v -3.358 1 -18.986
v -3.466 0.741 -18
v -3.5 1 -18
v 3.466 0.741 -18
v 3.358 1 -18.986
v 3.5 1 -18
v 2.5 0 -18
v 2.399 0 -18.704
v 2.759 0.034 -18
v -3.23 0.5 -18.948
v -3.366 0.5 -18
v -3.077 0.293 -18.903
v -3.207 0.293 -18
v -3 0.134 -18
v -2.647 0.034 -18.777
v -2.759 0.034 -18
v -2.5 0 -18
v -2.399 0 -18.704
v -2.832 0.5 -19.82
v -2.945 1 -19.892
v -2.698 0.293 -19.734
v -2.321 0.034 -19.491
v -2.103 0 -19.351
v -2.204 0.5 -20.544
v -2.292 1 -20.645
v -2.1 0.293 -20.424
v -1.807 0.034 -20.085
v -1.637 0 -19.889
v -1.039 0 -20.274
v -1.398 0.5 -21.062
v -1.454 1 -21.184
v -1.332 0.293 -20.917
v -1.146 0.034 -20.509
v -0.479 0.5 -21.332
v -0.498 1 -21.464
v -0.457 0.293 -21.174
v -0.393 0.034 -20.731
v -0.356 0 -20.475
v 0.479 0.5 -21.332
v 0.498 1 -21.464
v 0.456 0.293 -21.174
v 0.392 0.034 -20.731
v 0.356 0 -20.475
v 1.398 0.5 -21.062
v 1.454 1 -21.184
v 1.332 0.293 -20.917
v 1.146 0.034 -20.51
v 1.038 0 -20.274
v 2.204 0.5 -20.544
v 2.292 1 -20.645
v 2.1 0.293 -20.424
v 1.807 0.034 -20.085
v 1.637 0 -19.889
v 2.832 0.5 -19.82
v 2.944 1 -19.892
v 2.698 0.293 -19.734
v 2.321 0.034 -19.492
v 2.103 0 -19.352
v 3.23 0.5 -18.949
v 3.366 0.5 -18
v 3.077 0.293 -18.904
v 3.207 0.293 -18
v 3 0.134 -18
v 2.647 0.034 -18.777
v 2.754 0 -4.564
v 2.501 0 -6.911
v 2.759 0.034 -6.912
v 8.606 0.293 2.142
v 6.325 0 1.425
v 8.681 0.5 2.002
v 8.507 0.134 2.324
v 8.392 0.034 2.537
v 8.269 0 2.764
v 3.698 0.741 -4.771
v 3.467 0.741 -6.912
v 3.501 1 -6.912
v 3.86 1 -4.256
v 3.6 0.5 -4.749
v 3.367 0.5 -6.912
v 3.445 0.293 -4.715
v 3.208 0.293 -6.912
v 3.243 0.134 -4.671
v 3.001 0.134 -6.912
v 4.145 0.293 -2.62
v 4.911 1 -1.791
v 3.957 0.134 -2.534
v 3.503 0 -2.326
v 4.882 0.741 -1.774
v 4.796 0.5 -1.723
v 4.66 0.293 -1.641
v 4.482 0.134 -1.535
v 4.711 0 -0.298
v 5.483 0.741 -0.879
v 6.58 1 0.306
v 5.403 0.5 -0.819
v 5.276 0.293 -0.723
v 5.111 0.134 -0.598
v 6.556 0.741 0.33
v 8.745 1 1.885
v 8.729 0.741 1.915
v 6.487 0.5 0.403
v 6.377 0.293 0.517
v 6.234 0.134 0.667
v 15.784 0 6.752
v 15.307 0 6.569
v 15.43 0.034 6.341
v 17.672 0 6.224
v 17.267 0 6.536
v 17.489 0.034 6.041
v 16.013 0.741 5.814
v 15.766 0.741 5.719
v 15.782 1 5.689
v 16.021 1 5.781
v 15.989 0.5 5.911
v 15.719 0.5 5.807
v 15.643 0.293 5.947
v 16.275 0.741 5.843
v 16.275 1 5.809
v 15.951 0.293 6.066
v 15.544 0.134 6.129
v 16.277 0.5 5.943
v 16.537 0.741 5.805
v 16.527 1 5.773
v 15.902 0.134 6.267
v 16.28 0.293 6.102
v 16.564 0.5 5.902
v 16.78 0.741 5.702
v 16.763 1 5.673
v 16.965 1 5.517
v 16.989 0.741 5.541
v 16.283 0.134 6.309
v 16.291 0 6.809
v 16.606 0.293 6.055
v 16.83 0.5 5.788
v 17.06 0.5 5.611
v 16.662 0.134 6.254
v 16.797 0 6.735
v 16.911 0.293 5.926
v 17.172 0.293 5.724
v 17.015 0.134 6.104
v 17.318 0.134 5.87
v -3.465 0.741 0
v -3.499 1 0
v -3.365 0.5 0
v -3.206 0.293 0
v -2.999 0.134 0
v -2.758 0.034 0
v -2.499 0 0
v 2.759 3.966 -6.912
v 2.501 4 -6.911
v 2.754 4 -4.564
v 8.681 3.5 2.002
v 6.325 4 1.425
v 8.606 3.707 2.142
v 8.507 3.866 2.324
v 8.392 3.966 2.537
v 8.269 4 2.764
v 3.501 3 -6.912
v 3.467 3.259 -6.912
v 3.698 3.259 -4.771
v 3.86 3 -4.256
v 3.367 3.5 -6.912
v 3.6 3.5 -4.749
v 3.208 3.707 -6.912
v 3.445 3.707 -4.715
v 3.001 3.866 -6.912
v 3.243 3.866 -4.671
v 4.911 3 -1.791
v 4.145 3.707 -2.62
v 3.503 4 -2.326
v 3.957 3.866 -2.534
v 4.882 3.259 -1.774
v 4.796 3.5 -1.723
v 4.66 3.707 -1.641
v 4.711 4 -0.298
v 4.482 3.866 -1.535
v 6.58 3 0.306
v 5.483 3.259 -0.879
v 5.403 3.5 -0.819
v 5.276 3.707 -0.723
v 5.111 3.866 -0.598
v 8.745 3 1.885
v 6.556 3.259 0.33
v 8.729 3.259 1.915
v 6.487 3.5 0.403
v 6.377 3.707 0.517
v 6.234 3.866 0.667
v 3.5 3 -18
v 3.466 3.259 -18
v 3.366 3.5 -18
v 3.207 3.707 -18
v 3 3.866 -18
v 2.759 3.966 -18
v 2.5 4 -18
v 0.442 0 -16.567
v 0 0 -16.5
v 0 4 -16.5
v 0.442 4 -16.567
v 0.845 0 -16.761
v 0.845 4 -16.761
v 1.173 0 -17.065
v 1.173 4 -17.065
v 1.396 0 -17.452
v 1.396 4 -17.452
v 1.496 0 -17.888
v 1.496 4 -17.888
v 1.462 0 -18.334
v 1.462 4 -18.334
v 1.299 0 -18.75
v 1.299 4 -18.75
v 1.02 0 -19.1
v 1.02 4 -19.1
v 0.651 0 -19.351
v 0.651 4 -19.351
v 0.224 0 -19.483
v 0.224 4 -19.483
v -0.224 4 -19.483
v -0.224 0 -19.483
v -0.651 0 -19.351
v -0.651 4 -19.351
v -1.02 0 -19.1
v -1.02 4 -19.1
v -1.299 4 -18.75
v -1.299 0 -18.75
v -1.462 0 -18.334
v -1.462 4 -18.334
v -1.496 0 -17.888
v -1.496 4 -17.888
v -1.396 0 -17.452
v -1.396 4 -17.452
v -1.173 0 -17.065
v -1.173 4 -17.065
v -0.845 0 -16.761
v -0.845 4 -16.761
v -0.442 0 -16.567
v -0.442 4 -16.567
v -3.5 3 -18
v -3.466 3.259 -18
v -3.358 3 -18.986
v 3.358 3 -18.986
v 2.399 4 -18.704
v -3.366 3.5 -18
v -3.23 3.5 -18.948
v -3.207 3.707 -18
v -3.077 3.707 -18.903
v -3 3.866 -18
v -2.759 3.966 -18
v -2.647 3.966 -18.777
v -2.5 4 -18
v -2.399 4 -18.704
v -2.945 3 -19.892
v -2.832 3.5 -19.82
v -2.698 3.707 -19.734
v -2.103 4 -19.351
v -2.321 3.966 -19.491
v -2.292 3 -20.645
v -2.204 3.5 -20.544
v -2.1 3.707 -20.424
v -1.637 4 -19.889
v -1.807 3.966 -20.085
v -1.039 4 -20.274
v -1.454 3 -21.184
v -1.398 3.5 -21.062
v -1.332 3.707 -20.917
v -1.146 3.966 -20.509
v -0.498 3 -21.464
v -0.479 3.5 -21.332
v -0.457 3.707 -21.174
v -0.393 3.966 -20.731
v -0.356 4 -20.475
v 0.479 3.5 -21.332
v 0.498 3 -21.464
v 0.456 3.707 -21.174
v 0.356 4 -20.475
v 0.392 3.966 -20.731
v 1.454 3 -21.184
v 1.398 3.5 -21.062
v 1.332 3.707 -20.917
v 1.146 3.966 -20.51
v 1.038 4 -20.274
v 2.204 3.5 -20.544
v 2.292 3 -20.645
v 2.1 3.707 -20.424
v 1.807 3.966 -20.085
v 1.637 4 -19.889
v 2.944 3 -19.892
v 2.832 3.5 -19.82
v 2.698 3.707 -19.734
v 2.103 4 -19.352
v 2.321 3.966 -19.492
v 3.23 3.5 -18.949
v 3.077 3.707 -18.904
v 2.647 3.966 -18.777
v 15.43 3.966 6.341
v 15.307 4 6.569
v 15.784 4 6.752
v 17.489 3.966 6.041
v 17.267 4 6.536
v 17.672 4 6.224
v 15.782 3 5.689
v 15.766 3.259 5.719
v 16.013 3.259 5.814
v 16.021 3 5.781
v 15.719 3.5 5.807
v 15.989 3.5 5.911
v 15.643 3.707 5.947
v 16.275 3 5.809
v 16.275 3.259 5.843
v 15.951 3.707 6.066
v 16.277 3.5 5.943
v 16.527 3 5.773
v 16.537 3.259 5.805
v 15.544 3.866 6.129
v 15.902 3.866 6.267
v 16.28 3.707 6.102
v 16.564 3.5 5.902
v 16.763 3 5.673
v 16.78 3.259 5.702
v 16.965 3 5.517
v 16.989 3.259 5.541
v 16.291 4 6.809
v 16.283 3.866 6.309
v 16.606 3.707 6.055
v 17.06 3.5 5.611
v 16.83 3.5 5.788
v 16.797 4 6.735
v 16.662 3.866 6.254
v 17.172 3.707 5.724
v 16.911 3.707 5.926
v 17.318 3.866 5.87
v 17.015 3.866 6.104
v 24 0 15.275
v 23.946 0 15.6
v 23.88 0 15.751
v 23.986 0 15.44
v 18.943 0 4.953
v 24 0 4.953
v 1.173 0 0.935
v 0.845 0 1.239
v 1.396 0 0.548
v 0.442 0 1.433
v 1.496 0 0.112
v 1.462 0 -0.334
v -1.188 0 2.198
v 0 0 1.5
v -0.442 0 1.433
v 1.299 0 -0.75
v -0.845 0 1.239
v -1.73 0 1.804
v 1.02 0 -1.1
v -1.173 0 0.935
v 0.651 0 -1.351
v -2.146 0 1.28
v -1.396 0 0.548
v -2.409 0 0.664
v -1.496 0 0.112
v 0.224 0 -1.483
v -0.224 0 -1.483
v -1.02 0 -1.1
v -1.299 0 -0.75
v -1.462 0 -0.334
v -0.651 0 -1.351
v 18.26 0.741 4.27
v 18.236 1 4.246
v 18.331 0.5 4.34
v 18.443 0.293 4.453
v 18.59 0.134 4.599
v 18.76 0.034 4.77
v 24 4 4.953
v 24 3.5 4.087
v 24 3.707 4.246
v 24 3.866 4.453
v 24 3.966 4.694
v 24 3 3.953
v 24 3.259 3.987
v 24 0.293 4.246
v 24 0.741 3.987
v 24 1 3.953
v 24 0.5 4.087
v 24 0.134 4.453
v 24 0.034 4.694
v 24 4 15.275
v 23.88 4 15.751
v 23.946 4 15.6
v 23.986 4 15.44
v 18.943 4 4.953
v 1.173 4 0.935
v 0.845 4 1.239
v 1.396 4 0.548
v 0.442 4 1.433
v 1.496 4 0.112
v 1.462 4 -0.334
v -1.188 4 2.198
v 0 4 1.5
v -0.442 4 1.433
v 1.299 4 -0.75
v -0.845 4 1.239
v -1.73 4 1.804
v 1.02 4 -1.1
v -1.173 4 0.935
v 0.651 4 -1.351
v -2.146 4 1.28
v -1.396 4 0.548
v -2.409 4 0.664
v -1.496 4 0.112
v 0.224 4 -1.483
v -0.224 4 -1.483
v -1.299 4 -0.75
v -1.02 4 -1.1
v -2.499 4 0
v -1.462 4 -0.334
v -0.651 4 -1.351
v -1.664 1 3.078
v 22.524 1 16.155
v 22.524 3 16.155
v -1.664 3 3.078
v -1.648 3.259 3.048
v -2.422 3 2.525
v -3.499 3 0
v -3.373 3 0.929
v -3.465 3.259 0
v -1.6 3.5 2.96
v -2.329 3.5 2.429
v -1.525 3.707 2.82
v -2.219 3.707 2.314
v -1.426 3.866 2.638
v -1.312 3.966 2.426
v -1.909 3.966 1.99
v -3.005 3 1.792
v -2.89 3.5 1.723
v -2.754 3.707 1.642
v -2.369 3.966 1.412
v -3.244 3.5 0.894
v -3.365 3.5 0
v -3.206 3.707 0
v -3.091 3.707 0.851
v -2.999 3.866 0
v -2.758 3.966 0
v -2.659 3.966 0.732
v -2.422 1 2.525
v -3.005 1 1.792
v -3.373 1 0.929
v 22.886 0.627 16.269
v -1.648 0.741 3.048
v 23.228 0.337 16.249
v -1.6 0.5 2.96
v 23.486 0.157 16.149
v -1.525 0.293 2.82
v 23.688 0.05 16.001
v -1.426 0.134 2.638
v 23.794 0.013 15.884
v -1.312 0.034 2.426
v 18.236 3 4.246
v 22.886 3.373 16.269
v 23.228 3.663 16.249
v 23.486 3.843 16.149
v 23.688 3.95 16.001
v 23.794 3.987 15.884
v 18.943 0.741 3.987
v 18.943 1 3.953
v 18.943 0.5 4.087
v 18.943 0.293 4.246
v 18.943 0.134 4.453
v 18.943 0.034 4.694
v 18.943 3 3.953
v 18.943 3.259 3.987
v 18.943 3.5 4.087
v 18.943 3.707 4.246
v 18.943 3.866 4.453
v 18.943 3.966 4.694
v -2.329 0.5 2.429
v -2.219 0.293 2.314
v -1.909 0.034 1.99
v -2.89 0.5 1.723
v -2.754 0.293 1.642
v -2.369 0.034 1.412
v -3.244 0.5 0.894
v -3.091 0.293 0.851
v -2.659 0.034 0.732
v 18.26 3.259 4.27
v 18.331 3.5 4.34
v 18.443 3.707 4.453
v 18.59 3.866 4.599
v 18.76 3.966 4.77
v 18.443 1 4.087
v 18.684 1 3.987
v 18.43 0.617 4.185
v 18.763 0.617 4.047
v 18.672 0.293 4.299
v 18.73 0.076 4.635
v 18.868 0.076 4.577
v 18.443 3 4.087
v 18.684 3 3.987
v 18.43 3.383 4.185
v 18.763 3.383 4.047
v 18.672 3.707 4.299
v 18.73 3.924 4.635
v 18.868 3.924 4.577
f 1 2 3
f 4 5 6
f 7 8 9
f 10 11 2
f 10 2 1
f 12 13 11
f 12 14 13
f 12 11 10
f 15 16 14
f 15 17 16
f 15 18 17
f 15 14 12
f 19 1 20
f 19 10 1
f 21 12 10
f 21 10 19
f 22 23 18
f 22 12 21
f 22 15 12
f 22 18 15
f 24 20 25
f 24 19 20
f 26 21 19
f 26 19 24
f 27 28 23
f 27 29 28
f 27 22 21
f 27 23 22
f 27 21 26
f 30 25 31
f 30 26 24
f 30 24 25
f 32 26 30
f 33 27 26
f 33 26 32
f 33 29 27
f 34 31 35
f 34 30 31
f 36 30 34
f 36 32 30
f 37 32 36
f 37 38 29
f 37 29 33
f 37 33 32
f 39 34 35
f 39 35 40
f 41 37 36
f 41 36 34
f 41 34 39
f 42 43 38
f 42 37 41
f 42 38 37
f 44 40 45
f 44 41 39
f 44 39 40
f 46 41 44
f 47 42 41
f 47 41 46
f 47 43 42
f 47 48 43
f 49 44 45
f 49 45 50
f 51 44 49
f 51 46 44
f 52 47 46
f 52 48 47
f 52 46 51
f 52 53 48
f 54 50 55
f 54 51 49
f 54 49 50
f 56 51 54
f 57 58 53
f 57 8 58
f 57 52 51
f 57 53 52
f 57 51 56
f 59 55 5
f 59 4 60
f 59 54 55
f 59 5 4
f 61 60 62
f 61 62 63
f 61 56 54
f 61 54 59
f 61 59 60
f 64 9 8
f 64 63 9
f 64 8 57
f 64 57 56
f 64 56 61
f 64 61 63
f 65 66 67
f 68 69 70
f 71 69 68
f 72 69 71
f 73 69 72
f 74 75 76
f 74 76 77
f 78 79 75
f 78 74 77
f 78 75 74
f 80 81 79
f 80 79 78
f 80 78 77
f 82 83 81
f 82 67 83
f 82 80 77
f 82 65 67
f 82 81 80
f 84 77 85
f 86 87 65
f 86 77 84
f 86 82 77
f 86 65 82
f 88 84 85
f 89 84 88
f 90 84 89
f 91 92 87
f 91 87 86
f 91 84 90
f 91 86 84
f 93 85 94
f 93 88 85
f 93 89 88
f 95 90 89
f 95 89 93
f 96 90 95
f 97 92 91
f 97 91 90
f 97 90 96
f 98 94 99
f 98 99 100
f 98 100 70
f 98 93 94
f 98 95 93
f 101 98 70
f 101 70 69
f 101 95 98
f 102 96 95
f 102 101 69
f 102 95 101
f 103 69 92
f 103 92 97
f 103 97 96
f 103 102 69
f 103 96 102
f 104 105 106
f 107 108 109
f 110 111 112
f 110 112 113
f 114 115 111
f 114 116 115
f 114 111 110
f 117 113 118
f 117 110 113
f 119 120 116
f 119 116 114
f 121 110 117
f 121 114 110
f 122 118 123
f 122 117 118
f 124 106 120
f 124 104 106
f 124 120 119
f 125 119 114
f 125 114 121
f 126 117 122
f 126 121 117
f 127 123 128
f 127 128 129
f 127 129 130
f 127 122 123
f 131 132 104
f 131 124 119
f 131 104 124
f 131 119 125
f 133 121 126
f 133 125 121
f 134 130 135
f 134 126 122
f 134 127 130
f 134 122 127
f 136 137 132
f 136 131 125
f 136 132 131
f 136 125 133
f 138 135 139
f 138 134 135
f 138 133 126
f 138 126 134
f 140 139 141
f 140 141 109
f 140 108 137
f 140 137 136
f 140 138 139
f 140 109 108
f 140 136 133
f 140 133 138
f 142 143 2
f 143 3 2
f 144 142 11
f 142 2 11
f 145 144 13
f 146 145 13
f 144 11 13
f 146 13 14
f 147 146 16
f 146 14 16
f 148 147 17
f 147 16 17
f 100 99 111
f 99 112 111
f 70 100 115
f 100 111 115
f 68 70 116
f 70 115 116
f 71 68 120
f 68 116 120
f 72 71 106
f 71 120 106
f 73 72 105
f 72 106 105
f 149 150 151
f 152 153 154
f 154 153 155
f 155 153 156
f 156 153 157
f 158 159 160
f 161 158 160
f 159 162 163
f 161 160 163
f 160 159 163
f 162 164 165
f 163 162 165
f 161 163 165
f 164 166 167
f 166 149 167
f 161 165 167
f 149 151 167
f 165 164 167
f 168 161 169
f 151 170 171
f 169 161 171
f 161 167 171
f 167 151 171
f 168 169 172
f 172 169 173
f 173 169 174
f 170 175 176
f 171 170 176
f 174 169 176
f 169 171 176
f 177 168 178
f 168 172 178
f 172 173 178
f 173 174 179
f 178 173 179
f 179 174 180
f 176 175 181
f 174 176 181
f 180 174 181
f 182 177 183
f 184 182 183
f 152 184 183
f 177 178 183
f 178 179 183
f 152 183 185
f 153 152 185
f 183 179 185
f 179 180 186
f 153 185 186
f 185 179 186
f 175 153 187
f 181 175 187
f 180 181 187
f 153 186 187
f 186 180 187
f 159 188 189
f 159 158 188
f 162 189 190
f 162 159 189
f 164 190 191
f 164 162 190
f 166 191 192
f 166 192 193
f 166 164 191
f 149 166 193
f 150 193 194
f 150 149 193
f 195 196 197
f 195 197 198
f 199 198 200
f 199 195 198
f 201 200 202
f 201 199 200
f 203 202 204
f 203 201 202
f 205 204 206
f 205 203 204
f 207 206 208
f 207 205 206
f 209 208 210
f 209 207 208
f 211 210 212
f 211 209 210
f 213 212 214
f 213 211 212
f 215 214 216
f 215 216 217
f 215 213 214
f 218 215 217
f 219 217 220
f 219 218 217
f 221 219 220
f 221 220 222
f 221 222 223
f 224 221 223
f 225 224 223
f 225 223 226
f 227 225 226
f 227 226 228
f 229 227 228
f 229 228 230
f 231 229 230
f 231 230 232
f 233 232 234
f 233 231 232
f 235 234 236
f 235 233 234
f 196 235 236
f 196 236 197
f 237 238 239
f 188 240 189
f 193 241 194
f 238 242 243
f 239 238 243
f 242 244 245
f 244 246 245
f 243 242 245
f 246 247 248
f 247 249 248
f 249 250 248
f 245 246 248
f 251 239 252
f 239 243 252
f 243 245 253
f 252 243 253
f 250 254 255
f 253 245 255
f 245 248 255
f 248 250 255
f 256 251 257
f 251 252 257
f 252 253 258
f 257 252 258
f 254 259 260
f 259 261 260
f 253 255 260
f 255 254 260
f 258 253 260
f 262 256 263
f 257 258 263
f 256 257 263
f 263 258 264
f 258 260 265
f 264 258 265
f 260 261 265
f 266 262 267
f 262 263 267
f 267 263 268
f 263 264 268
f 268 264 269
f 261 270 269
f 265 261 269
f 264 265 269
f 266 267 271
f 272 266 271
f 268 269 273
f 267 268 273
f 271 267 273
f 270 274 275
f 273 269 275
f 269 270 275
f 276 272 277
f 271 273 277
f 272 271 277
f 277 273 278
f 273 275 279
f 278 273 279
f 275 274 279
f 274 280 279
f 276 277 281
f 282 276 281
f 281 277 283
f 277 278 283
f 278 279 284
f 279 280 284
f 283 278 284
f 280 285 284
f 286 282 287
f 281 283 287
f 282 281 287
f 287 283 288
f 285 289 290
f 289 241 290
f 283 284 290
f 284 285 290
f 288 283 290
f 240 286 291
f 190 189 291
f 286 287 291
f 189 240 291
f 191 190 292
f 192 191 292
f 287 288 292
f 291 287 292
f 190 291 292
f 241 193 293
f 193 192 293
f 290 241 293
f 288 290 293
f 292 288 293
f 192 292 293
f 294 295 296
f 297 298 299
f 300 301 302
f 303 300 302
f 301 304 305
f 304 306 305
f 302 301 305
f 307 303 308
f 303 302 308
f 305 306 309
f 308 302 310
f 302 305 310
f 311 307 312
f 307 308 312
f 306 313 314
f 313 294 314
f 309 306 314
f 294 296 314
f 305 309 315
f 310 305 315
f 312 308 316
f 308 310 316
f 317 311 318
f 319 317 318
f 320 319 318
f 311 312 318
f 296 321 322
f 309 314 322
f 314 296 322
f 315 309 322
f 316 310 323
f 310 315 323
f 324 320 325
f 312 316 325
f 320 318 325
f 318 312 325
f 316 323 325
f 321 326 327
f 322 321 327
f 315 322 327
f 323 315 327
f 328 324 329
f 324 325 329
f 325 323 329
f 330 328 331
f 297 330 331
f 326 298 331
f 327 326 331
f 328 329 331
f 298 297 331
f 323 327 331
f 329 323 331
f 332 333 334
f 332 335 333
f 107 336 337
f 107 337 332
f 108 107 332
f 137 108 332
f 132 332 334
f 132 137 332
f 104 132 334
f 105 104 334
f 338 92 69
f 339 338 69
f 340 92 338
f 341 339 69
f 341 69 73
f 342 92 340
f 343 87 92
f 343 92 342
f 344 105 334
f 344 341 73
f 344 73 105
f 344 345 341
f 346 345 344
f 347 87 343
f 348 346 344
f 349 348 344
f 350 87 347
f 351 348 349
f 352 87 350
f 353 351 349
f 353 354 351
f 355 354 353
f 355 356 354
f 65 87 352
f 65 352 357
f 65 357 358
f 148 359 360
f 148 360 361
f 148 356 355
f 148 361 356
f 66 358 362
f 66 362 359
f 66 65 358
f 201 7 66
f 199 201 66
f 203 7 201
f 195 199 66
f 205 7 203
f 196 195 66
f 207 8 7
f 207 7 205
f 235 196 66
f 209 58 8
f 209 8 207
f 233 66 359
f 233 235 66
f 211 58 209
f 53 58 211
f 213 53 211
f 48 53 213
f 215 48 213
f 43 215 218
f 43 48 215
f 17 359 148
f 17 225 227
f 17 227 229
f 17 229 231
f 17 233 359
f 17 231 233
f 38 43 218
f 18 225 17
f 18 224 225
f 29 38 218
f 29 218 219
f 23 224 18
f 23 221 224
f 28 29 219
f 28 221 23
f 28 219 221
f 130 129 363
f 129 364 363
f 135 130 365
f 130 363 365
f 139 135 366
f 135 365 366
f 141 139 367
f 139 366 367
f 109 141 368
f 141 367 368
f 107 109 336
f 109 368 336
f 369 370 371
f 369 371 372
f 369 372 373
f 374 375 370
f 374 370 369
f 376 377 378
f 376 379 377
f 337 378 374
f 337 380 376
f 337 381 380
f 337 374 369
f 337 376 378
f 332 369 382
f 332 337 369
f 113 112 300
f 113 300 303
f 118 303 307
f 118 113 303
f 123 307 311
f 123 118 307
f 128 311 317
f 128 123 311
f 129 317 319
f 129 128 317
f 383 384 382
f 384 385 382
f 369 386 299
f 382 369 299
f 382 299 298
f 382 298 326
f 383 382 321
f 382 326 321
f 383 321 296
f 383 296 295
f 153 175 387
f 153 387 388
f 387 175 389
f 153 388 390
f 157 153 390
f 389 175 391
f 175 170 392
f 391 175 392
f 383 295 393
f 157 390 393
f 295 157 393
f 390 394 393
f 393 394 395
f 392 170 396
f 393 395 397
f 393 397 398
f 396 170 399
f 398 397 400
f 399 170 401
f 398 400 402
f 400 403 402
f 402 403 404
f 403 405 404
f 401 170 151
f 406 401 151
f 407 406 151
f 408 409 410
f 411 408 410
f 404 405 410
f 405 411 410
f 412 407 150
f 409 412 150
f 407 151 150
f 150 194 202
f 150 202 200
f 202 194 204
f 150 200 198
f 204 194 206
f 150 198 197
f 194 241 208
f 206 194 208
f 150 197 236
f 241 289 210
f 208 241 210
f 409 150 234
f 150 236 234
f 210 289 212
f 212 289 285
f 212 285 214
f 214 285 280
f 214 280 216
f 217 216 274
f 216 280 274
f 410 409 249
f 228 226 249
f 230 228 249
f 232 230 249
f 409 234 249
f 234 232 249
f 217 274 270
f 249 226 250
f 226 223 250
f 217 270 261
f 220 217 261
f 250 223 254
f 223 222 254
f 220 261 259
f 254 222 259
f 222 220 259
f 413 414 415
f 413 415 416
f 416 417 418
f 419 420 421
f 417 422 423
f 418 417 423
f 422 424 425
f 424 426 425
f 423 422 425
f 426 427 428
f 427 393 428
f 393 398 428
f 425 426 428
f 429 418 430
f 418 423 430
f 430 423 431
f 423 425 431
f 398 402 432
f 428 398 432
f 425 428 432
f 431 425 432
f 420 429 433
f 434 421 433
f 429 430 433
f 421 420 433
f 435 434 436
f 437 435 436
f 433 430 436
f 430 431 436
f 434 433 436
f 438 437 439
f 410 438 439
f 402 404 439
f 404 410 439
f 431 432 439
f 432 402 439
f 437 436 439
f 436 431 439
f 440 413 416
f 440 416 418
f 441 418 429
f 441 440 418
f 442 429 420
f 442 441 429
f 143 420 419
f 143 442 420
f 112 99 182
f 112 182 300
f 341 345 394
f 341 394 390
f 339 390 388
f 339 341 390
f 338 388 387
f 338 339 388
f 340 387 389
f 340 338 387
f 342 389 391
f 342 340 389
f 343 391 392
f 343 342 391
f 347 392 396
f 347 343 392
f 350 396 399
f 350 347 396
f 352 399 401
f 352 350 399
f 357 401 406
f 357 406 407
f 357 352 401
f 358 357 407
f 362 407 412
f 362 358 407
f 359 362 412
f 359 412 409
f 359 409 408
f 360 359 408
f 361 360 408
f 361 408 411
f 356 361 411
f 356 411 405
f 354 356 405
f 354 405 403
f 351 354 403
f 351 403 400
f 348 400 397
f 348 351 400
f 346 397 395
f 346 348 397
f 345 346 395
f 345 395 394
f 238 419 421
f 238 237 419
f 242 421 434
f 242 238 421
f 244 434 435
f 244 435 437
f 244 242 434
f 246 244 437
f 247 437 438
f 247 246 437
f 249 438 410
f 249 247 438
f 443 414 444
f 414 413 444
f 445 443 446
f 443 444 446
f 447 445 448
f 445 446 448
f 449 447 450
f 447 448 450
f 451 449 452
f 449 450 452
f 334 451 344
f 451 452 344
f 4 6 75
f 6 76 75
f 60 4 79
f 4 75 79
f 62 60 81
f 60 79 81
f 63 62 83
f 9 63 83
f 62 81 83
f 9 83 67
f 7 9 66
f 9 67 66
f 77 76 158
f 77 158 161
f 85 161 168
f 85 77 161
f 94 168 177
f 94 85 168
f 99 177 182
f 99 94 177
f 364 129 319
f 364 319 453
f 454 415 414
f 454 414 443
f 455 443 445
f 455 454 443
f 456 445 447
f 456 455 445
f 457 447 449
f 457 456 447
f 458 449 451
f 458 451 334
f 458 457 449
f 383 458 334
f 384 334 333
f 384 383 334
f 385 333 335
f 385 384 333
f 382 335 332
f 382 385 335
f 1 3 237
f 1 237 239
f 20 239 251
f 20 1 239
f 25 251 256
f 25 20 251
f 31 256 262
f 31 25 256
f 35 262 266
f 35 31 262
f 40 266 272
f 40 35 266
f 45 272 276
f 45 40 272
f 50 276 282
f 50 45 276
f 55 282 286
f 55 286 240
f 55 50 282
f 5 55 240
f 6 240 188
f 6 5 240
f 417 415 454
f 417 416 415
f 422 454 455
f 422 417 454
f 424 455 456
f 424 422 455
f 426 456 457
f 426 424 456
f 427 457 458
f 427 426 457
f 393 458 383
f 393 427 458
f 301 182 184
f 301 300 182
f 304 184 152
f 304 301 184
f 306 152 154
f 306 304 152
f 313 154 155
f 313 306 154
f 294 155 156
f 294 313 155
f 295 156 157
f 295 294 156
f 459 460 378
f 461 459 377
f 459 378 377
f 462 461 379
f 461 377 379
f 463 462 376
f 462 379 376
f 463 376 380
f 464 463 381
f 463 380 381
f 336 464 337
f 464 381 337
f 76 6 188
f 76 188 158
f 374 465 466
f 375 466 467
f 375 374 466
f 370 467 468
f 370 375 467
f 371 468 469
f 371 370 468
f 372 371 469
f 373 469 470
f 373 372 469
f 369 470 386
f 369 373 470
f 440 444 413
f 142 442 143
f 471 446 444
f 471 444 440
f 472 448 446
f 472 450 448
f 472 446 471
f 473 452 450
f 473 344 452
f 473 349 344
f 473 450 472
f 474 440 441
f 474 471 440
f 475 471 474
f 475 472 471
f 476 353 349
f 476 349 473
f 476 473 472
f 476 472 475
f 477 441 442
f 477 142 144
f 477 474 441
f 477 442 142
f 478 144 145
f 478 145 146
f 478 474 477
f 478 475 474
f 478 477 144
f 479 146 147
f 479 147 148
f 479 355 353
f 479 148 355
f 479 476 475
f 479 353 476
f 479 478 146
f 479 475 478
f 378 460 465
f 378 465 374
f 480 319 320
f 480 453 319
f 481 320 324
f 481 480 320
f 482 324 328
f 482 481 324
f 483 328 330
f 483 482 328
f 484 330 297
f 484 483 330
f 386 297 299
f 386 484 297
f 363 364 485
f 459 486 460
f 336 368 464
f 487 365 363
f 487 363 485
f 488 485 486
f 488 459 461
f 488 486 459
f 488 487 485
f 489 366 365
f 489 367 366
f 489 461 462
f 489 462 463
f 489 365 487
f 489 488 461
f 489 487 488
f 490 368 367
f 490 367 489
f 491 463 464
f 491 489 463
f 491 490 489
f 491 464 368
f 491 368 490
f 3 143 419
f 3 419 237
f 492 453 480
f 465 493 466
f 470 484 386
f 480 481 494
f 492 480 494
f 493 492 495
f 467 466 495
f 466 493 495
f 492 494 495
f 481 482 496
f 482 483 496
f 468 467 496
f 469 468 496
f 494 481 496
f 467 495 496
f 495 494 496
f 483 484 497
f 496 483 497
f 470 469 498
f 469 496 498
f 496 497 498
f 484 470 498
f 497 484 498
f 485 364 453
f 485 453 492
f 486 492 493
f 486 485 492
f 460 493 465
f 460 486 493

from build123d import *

# Parameters (mm, degrees)
SKETCH1_R           = 1.5
BOSS_EXTRUDE1_DEPTH = 4
FILLET1_R           = 1


with BuildPart() as part:
    # Sketch1 → Boss-Extrude1 (new body)
    with BuildSketch(Plane(origin=(0, 0, 0), x_dir=(1, 0, 0), z_dir=(0, 1, 0))):
        with BuildLine():
            Line((3.499999994, 18.000210437), (3.500666698, 6.911553125))
            ThreePointArc((3.500666698, 6.911553125), (4.91134936, 1.791253282), (8.744863366, -1.884568587))
            Line((8.744863366, -1.884568587), (15.782241735, -5.689211238))
            ThreePointArc((15.782241735, -5.689211238), (16.402202946, -5.79906113), (16.964928847, -5.516645723))
            Line((16.964928847, -5.516645723), (18.23595273, -4.24562184))
            ThreePointArc((18.23595273, -4.24562184), (18.560376079, -4.028849089), (18.943059511, -3.952728622))
            Line((18.943059511, -3.952728622), (24, -3.952728622))
            Line((24, -3.952728622), (24, -16.952728622))
            Line((24, -16.952728622), (-1.664016467, -3.077901019))
            ThreePointArc((-1.664016467, -3.077901019), (-3.005385337, -1.791670857), (-3.498917759, -6.5e-08))
            Line((-3.498917759, -6.5e-08), (-3.499999994, 17.999789563))
            ThreePointArc((-3.499999994, 17.999789563), (-0.000210437, 21.499999994), (3.499999994, 18.000210437))
        make_face()
        with Locations(Location((0, 0, 0), (0, 0, 270))):
            Circle(SKETCH1_R, mode=Mode.SUBTRACT)
        with Locations(Location((0, 18, 0), (0, 0, 270))):
            Circle(SKETCH1_R, mode=Mode.SUBTRACT)
    extrude(amount=BOSS_EXTRUDE1_DEPTH)

    # Fillet1
    fillet1_edges = [part.edges().sort_by_distance(p)[0] for p in [
        (-3.005385337, 4, 1.791670857),
        (3.500333346, 0, -12.455881781),
        (4.91134936, 0, -1.791253282),
        (12.26355255, 0, 3.786889912),
        (16.402202946, 0, 5.79906113),
        (17.600440788, 0, 4.881133782),
        (18.560376079, 0, 4.028849089),
        (11.167991766, 4, 10.01531482),
        (21.471529755, 0, 3.952728622),
        (11.167991766, 0, 10.01531482),
        (-3.005385337, 0, 1.791670857),
        (-3.499458876, 0, -8.999894749),
        (-0.000210437, 0, -21.499999994),
        (21.471529755, 4, 3.952728622),
        (24, 2, 16.952728622),
        (18.560376079, 4, 4.028849089),
        (17.600440788, 4, 4.881133782),
        (16.402202946, 4, 5.79906113),
        (12.26355255, 4, 3.786889912),
        (4.91134936, 4, -1.791253282),
        (3.500333346, 4, -12.455881781),
        (-0.000210437, 4, -21.499999994),
        (-3.499458876, 4, -8.999894749),
    ]]
    fillet(fillet1_edges, radius=FILLET1_R)


solid = part.part
